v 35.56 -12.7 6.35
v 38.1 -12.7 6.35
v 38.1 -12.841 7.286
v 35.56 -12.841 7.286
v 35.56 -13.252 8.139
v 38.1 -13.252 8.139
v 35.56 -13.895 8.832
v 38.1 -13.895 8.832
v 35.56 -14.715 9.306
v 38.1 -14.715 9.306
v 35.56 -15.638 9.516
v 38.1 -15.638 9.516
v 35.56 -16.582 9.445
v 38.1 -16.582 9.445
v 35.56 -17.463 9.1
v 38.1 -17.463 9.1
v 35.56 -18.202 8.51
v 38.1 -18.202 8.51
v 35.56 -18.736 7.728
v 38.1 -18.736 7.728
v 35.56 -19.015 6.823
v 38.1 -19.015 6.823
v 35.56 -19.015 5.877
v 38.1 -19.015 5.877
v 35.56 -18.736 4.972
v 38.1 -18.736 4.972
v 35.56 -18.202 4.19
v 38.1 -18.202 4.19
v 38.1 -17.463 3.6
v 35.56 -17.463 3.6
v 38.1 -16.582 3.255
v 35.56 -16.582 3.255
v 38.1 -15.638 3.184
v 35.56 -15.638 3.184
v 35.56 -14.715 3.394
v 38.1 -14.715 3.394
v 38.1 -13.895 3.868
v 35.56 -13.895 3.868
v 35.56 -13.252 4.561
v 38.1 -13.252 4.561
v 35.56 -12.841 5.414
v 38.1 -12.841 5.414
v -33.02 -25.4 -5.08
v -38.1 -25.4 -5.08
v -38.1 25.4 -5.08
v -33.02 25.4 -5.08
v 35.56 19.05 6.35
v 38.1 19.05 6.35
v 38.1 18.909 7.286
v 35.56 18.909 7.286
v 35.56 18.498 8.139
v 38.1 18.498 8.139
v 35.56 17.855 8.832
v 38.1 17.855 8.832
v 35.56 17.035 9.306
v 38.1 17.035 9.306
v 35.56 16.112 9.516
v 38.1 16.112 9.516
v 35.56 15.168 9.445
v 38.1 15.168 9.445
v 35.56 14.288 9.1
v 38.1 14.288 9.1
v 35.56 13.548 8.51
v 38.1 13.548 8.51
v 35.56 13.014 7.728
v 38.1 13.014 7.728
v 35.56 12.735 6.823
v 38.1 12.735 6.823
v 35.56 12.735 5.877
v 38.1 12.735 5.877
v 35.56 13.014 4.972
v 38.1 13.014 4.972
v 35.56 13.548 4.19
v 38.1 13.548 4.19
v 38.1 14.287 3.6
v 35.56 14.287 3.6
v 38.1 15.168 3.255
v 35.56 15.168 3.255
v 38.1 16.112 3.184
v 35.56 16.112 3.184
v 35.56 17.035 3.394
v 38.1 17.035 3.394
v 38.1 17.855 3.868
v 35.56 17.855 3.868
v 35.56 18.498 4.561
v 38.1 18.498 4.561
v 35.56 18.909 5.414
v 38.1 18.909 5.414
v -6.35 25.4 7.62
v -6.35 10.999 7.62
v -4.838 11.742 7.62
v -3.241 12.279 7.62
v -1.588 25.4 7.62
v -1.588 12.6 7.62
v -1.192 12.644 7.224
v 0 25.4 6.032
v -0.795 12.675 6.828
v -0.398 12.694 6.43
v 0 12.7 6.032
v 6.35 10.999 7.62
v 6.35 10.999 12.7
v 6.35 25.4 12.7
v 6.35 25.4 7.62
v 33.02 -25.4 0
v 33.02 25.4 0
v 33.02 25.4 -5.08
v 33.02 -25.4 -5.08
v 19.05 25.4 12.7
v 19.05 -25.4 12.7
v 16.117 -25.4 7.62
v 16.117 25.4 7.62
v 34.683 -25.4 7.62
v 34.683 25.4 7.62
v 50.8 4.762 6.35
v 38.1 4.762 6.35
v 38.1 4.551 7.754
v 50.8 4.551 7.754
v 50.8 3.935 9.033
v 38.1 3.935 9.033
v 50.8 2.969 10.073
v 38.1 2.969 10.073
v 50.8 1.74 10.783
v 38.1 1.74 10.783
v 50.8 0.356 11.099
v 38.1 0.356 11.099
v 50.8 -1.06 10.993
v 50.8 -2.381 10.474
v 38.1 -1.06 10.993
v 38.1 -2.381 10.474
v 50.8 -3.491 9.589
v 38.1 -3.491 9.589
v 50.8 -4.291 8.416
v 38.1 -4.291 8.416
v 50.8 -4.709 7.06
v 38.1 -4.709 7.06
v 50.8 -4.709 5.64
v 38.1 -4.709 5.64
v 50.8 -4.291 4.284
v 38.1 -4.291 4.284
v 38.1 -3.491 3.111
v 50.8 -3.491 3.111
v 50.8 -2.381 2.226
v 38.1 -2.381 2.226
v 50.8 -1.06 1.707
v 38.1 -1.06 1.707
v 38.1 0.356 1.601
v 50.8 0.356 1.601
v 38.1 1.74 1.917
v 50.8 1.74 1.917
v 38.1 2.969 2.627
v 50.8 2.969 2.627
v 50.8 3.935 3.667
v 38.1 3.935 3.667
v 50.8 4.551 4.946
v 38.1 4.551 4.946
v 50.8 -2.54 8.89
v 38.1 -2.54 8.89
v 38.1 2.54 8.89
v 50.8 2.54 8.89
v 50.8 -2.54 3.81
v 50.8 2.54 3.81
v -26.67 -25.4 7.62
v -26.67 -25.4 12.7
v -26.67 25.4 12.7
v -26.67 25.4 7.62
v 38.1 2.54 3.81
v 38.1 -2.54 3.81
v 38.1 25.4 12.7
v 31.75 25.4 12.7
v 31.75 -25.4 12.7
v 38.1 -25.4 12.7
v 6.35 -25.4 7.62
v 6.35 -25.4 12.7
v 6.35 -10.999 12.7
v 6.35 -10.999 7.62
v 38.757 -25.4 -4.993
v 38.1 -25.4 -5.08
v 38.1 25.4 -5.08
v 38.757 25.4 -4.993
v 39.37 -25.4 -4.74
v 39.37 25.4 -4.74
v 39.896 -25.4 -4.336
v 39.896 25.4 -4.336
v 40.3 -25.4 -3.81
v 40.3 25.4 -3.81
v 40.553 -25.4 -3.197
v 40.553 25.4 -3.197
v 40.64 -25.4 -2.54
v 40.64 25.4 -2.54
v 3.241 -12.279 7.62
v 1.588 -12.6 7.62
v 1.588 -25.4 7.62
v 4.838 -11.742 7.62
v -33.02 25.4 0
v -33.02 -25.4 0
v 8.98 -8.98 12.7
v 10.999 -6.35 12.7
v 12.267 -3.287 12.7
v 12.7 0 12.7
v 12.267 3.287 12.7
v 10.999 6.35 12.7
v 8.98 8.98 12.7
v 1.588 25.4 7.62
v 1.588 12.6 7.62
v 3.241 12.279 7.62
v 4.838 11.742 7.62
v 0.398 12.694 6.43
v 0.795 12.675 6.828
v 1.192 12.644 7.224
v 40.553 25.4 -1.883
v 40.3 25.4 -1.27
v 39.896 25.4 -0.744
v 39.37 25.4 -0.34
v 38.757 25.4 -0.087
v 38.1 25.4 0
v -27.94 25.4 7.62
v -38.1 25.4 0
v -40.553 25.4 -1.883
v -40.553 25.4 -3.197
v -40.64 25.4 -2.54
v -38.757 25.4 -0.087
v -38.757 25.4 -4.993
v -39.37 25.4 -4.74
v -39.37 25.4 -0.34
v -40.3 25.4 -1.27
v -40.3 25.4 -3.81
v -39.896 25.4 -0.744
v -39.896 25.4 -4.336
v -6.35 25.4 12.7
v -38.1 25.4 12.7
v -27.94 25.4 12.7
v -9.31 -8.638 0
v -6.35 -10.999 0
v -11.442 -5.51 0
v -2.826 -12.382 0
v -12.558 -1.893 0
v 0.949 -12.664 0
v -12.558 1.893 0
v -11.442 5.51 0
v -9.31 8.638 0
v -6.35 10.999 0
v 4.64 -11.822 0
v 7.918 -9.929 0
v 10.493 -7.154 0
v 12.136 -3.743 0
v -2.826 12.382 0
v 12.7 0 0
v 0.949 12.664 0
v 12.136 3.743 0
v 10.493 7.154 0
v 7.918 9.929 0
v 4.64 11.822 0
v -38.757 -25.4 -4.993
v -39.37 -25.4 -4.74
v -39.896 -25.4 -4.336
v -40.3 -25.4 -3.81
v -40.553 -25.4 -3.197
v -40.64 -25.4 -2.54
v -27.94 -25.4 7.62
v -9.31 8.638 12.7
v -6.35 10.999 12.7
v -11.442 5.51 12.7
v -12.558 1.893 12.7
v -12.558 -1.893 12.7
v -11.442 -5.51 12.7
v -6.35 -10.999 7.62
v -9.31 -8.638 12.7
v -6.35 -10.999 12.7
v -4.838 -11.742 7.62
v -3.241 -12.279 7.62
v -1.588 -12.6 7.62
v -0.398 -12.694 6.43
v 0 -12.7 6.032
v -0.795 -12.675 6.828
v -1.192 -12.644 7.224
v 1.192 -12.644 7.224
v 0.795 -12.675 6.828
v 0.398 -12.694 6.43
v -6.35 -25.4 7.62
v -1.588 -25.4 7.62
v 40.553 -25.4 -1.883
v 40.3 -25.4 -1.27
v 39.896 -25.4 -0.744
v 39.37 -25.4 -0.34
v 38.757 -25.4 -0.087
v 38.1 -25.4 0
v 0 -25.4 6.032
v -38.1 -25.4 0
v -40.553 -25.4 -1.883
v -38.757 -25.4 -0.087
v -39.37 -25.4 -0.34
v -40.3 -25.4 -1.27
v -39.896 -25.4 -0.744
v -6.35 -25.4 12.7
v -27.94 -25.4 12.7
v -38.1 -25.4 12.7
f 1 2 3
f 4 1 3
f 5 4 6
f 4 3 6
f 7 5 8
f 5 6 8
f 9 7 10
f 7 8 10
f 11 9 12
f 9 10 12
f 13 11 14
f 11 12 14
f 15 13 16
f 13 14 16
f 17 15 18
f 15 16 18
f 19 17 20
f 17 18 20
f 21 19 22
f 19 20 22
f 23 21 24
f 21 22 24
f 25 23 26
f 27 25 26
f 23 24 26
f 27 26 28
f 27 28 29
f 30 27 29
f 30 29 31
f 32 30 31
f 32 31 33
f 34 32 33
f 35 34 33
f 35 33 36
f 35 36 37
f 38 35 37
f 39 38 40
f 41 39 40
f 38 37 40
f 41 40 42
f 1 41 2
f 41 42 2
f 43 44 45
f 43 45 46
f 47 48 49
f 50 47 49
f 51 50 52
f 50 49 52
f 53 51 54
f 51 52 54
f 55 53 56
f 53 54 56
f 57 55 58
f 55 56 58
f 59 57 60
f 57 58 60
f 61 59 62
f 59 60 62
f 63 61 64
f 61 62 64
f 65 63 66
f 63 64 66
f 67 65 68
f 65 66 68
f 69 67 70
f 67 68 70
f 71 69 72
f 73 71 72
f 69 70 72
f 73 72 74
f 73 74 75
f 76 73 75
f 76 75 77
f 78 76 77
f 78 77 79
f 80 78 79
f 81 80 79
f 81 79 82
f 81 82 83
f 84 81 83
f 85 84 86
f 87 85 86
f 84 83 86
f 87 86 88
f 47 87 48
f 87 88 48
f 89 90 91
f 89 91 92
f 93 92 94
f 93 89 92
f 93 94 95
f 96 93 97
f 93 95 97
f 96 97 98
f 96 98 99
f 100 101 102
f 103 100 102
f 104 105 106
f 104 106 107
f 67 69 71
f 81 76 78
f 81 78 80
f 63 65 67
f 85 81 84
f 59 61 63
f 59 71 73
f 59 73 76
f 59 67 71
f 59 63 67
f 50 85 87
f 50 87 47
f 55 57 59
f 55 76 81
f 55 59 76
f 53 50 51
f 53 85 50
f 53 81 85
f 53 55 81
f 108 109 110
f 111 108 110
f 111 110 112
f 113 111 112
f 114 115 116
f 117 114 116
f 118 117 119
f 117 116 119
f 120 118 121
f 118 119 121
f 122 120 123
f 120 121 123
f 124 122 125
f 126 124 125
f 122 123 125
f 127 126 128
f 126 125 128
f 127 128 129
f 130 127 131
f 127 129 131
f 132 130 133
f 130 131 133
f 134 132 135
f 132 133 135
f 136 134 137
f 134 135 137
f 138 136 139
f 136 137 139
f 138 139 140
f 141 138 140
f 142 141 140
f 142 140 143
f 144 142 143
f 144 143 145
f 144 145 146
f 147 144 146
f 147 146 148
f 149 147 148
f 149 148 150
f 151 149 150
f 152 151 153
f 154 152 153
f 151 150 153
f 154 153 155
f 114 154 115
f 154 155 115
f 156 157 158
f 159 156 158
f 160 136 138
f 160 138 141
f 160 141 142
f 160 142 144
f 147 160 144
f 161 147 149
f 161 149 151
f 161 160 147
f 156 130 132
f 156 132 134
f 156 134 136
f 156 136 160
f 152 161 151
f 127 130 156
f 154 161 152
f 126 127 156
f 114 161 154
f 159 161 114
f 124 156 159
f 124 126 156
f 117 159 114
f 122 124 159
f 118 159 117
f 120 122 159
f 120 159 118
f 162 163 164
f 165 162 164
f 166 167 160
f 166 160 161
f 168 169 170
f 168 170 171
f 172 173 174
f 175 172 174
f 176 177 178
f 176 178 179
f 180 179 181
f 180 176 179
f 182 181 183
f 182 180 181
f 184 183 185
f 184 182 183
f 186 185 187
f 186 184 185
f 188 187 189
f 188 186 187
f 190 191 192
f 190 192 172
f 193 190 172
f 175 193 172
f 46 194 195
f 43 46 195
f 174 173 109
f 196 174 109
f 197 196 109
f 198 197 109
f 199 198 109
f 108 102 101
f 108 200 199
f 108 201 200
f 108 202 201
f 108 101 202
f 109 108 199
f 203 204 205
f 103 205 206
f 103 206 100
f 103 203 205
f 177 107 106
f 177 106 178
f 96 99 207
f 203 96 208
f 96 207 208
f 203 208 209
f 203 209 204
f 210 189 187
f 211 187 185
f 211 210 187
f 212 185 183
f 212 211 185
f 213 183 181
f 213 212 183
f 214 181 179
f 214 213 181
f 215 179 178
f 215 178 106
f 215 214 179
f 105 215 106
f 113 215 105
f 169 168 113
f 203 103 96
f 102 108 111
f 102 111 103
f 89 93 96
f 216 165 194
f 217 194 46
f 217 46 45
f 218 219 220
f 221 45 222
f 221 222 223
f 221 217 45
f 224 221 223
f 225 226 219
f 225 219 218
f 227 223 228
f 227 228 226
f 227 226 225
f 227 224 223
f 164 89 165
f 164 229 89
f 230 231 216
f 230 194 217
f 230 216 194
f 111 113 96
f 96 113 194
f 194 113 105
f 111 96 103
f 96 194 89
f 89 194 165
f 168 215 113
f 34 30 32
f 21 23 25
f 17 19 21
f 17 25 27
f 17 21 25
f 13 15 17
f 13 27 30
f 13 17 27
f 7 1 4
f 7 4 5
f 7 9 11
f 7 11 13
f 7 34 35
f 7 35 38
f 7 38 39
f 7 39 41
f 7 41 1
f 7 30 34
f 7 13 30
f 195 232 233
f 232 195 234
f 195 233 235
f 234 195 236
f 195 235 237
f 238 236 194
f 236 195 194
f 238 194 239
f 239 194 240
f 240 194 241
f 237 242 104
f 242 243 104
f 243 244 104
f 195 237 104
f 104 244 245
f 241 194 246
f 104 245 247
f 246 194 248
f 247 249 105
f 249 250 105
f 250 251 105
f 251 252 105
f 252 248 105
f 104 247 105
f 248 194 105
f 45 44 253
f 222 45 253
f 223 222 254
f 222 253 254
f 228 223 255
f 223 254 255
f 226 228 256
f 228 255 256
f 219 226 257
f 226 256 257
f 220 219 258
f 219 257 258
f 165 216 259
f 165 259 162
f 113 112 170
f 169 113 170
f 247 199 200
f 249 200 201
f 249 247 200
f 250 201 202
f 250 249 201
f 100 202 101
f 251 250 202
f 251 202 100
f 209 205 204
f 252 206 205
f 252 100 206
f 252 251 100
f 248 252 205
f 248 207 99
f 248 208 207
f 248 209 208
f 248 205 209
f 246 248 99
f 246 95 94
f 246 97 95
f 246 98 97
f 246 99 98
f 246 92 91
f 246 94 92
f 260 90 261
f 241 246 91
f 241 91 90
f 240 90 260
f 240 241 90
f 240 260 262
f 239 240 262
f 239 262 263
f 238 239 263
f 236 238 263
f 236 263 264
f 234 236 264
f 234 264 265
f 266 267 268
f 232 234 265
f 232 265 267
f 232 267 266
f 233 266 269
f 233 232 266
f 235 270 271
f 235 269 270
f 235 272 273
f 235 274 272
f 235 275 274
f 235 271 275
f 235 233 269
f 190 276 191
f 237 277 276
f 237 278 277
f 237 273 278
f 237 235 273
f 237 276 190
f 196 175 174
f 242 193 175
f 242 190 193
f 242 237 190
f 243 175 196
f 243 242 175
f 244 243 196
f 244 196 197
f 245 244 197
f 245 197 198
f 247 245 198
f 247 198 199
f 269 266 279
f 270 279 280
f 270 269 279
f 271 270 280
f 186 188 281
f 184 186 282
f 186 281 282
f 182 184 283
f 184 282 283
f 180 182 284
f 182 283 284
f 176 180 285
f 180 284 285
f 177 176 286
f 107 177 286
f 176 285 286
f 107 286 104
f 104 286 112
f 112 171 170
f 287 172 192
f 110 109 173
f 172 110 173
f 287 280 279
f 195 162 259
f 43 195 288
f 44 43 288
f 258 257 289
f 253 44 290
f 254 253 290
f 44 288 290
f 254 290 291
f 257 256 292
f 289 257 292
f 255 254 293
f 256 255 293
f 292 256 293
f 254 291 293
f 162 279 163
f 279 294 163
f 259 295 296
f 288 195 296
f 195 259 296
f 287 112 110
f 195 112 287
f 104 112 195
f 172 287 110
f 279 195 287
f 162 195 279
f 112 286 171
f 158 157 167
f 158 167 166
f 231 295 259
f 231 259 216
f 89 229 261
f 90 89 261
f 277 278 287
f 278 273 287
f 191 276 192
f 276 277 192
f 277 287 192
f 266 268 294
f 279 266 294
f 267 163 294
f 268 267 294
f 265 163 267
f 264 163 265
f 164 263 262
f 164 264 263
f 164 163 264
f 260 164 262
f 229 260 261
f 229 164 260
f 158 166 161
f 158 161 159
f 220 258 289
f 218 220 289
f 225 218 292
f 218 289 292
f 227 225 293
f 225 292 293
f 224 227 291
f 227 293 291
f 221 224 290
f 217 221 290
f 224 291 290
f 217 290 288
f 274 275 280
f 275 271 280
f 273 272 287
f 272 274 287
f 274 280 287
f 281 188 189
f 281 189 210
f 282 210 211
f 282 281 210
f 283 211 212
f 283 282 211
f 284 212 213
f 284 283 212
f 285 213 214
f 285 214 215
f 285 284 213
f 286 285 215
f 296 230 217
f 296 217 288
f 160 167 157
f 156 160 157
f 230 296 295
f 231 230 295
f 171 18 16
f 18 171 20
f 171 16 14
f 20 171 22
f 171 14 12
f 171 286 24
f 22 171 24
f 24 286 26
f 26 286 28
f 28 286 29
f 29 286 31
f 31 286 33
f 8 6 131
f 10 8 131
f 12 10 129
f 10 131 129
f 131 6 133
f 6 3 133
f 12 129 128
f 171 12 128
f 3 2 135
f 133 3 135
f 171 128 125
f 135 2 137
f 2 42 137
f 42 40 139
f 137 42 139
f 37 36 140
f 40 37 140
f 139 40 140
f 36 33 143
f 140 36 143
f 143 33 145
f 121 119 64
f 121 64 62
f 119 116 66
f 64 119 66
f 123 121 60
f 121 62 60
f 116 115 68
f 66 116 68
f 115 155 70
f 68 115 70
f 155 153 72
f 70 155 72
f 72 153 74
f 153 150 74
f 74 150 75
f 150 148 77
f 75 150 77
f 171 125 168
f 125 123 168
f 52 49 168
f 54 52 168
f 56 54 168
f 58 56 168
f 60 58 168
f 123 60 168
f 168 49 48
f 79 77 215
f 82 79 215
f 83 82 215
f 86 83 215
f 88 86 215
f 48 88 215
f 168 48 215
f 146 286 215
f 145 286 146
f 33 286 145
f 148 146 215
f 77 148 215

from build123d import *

# Parameters (mm, degrees)
F0_W      = 76.2
F0_H      = 50.8
F0_R      = 12.7
F1_DEPTH  = 12.7
F2_W      = 1.27
F2_H      = 50.8
F3_DEPTH  = 5.08
F5_DEPTH  = 50.801
F6_R      = 4.7625
F7_DEPTH  = 12.7
F8_W      = 5.08
F8_H      = 50.8
F9_DEPTH  = 5.08
F10_W     = 5.08
F10_H     = 5.08
F11_DEPTH = 12.7
F13_DEPTH = 50.8
F14_R     = 3.175
F15_DEPTH = 2.54
F17_DEPTH = 50.801


# Not quite as in the source:
# - a pattern or mirror of a feature is missing from the dataset's text; its kind, count and spacing are read off the source's solid


with BuildPart() as f1:
    # F0 (on Top) → F1 (new body)
    with BuildSketch(Plane.XY):
        Rectangle(F0_W, F0_H)
        Circle(F0_R, mode=Mode.SUBTRACT)
    extrude(amount=F1_DEPTH)

    # F2 (on face) → F3 (cut)
    with BuildSketch(Plane.XY.offset(12.7)):
        with Locations((-27.305, 0)):
            Rectangle(F2_W, F2_H)
        with BuildLine():
            Line((-6.35, -10.9985226281), (-6.35, -25.4))
            Line((-6.35, -25.4), (6.35, -25.4))
            Line((6.35, -25.4), (6.35, -10.9985226281))
            ThreePointArc((6.35, -10.9985226281), (0, -12.7), (-6.35, -10.9985226281))
        make_face()
        with BuildLine():
            Line((6.35, 25.4), (-6.35, 25.4))
            Line((-6.35, 25.4), (-6.35, 10.9985226281))
            ThreePointArc((-6.35, 10.9985226281), (0, 12.7), (6.35, 10.9985226281))
            Line((6.35, 10.9985226281), (6.35, 25.4))
        make_face()
    extrude(amount=-F3_DEPTH, mode=Mode.SUBTRACT)

    # F4 (on face) → F5 (cut, through all)
    with BuildSketch(Plane.XZ.offset(25.4)):
        Polygon((31.75, 12.7), (19.05, 12.7), (16.1170606325, 7.62), (34.6829393675, 7.62), align=None)
    extrude(amount=-F5_DEPTH, mode=Mode.SUBTRACT)

    # F6 (on face) → F7 (join)
    with BuildSketch(Plane.YZ.offset(38.1)):
        with Locations((0, 6.35)):
            Circle(F6_R)
    extrude(amount=F7_DEPTH)

    # F8 (on face) → F9 (join)
    with BuildSketch(Plane(origin=(0, 0, 0), x_dir=(1, 0, 0), z_dir=(0, 0, -1))):
        with Locations((-35.56, 0)):
            Rectangle(F8_W, F8_H)
        with Locations((35.56, 0)):
            Rectangle(F8_W, F8_H)
    extrude(amount=F9_DEPTH)

    # F10 (on face) → F11 (cut)
    with BuildSketch(Plane.YZ.offset(50.8)):
        with Locations((0, 6.35)):
            Rectangle(F10_W, F10_H)
    extrude(amount=-F11_DEPTH, mode=Mode.SUBTRACT)

    # F12 (on face) → F13 (join, through all)
    with BuildSketch(Plane.XZ.offset(25.4)):
        with BuildLine():
            ThreePointArc((38.1, -5.08), (39.8960512242, -4.3360512242), (40.64, -2.54))
            ThreePointArc((40.64, -2.54), (39.8960512242, -0.7439487758), (38.1, 0))
            Line((38.1, 0), (38.1, -5.08))
        make_face()
        with BuildLine():
            Line((38.1, -5.08), (38.1, 0))
            ThreePointArc((38.1, 0), (35.56, -2.54), (38.1, -5.08))
        make_face()
    f13 = extrude(amount=-F13_DEPTH)

    # F13_copies: F13 across plane
    add(f13.mirror(Plane(origin=(0, 0, 0), x_dir=(0, 0, -1), z_dir=(-1, 0, 0))))

    # F14 (on face) → F15 (cut)
    with BuildSketch(Plane.YZ.offset(38.1)):
        with Locations((-15.875, 6.35)):
            Circle(F14_R)
        with Locations((15.875, 6.35)):
            Circle(F14_R)
    extrude(amount=-F15_DEPTH, mode=Mode.SUBTRACT)

    # F16 (on face) → F17 (cut, through all)
    with BuildSketch(Plane.XZ.offset(25.4)):
        Polygon((-1.5875, 7.62), (0, 6.0325), (1.5875, 7.62), align=None)
    extrude(amount=-F17_DEPTH, mode=Mode.SUBTRACT)


solid = f1.part
